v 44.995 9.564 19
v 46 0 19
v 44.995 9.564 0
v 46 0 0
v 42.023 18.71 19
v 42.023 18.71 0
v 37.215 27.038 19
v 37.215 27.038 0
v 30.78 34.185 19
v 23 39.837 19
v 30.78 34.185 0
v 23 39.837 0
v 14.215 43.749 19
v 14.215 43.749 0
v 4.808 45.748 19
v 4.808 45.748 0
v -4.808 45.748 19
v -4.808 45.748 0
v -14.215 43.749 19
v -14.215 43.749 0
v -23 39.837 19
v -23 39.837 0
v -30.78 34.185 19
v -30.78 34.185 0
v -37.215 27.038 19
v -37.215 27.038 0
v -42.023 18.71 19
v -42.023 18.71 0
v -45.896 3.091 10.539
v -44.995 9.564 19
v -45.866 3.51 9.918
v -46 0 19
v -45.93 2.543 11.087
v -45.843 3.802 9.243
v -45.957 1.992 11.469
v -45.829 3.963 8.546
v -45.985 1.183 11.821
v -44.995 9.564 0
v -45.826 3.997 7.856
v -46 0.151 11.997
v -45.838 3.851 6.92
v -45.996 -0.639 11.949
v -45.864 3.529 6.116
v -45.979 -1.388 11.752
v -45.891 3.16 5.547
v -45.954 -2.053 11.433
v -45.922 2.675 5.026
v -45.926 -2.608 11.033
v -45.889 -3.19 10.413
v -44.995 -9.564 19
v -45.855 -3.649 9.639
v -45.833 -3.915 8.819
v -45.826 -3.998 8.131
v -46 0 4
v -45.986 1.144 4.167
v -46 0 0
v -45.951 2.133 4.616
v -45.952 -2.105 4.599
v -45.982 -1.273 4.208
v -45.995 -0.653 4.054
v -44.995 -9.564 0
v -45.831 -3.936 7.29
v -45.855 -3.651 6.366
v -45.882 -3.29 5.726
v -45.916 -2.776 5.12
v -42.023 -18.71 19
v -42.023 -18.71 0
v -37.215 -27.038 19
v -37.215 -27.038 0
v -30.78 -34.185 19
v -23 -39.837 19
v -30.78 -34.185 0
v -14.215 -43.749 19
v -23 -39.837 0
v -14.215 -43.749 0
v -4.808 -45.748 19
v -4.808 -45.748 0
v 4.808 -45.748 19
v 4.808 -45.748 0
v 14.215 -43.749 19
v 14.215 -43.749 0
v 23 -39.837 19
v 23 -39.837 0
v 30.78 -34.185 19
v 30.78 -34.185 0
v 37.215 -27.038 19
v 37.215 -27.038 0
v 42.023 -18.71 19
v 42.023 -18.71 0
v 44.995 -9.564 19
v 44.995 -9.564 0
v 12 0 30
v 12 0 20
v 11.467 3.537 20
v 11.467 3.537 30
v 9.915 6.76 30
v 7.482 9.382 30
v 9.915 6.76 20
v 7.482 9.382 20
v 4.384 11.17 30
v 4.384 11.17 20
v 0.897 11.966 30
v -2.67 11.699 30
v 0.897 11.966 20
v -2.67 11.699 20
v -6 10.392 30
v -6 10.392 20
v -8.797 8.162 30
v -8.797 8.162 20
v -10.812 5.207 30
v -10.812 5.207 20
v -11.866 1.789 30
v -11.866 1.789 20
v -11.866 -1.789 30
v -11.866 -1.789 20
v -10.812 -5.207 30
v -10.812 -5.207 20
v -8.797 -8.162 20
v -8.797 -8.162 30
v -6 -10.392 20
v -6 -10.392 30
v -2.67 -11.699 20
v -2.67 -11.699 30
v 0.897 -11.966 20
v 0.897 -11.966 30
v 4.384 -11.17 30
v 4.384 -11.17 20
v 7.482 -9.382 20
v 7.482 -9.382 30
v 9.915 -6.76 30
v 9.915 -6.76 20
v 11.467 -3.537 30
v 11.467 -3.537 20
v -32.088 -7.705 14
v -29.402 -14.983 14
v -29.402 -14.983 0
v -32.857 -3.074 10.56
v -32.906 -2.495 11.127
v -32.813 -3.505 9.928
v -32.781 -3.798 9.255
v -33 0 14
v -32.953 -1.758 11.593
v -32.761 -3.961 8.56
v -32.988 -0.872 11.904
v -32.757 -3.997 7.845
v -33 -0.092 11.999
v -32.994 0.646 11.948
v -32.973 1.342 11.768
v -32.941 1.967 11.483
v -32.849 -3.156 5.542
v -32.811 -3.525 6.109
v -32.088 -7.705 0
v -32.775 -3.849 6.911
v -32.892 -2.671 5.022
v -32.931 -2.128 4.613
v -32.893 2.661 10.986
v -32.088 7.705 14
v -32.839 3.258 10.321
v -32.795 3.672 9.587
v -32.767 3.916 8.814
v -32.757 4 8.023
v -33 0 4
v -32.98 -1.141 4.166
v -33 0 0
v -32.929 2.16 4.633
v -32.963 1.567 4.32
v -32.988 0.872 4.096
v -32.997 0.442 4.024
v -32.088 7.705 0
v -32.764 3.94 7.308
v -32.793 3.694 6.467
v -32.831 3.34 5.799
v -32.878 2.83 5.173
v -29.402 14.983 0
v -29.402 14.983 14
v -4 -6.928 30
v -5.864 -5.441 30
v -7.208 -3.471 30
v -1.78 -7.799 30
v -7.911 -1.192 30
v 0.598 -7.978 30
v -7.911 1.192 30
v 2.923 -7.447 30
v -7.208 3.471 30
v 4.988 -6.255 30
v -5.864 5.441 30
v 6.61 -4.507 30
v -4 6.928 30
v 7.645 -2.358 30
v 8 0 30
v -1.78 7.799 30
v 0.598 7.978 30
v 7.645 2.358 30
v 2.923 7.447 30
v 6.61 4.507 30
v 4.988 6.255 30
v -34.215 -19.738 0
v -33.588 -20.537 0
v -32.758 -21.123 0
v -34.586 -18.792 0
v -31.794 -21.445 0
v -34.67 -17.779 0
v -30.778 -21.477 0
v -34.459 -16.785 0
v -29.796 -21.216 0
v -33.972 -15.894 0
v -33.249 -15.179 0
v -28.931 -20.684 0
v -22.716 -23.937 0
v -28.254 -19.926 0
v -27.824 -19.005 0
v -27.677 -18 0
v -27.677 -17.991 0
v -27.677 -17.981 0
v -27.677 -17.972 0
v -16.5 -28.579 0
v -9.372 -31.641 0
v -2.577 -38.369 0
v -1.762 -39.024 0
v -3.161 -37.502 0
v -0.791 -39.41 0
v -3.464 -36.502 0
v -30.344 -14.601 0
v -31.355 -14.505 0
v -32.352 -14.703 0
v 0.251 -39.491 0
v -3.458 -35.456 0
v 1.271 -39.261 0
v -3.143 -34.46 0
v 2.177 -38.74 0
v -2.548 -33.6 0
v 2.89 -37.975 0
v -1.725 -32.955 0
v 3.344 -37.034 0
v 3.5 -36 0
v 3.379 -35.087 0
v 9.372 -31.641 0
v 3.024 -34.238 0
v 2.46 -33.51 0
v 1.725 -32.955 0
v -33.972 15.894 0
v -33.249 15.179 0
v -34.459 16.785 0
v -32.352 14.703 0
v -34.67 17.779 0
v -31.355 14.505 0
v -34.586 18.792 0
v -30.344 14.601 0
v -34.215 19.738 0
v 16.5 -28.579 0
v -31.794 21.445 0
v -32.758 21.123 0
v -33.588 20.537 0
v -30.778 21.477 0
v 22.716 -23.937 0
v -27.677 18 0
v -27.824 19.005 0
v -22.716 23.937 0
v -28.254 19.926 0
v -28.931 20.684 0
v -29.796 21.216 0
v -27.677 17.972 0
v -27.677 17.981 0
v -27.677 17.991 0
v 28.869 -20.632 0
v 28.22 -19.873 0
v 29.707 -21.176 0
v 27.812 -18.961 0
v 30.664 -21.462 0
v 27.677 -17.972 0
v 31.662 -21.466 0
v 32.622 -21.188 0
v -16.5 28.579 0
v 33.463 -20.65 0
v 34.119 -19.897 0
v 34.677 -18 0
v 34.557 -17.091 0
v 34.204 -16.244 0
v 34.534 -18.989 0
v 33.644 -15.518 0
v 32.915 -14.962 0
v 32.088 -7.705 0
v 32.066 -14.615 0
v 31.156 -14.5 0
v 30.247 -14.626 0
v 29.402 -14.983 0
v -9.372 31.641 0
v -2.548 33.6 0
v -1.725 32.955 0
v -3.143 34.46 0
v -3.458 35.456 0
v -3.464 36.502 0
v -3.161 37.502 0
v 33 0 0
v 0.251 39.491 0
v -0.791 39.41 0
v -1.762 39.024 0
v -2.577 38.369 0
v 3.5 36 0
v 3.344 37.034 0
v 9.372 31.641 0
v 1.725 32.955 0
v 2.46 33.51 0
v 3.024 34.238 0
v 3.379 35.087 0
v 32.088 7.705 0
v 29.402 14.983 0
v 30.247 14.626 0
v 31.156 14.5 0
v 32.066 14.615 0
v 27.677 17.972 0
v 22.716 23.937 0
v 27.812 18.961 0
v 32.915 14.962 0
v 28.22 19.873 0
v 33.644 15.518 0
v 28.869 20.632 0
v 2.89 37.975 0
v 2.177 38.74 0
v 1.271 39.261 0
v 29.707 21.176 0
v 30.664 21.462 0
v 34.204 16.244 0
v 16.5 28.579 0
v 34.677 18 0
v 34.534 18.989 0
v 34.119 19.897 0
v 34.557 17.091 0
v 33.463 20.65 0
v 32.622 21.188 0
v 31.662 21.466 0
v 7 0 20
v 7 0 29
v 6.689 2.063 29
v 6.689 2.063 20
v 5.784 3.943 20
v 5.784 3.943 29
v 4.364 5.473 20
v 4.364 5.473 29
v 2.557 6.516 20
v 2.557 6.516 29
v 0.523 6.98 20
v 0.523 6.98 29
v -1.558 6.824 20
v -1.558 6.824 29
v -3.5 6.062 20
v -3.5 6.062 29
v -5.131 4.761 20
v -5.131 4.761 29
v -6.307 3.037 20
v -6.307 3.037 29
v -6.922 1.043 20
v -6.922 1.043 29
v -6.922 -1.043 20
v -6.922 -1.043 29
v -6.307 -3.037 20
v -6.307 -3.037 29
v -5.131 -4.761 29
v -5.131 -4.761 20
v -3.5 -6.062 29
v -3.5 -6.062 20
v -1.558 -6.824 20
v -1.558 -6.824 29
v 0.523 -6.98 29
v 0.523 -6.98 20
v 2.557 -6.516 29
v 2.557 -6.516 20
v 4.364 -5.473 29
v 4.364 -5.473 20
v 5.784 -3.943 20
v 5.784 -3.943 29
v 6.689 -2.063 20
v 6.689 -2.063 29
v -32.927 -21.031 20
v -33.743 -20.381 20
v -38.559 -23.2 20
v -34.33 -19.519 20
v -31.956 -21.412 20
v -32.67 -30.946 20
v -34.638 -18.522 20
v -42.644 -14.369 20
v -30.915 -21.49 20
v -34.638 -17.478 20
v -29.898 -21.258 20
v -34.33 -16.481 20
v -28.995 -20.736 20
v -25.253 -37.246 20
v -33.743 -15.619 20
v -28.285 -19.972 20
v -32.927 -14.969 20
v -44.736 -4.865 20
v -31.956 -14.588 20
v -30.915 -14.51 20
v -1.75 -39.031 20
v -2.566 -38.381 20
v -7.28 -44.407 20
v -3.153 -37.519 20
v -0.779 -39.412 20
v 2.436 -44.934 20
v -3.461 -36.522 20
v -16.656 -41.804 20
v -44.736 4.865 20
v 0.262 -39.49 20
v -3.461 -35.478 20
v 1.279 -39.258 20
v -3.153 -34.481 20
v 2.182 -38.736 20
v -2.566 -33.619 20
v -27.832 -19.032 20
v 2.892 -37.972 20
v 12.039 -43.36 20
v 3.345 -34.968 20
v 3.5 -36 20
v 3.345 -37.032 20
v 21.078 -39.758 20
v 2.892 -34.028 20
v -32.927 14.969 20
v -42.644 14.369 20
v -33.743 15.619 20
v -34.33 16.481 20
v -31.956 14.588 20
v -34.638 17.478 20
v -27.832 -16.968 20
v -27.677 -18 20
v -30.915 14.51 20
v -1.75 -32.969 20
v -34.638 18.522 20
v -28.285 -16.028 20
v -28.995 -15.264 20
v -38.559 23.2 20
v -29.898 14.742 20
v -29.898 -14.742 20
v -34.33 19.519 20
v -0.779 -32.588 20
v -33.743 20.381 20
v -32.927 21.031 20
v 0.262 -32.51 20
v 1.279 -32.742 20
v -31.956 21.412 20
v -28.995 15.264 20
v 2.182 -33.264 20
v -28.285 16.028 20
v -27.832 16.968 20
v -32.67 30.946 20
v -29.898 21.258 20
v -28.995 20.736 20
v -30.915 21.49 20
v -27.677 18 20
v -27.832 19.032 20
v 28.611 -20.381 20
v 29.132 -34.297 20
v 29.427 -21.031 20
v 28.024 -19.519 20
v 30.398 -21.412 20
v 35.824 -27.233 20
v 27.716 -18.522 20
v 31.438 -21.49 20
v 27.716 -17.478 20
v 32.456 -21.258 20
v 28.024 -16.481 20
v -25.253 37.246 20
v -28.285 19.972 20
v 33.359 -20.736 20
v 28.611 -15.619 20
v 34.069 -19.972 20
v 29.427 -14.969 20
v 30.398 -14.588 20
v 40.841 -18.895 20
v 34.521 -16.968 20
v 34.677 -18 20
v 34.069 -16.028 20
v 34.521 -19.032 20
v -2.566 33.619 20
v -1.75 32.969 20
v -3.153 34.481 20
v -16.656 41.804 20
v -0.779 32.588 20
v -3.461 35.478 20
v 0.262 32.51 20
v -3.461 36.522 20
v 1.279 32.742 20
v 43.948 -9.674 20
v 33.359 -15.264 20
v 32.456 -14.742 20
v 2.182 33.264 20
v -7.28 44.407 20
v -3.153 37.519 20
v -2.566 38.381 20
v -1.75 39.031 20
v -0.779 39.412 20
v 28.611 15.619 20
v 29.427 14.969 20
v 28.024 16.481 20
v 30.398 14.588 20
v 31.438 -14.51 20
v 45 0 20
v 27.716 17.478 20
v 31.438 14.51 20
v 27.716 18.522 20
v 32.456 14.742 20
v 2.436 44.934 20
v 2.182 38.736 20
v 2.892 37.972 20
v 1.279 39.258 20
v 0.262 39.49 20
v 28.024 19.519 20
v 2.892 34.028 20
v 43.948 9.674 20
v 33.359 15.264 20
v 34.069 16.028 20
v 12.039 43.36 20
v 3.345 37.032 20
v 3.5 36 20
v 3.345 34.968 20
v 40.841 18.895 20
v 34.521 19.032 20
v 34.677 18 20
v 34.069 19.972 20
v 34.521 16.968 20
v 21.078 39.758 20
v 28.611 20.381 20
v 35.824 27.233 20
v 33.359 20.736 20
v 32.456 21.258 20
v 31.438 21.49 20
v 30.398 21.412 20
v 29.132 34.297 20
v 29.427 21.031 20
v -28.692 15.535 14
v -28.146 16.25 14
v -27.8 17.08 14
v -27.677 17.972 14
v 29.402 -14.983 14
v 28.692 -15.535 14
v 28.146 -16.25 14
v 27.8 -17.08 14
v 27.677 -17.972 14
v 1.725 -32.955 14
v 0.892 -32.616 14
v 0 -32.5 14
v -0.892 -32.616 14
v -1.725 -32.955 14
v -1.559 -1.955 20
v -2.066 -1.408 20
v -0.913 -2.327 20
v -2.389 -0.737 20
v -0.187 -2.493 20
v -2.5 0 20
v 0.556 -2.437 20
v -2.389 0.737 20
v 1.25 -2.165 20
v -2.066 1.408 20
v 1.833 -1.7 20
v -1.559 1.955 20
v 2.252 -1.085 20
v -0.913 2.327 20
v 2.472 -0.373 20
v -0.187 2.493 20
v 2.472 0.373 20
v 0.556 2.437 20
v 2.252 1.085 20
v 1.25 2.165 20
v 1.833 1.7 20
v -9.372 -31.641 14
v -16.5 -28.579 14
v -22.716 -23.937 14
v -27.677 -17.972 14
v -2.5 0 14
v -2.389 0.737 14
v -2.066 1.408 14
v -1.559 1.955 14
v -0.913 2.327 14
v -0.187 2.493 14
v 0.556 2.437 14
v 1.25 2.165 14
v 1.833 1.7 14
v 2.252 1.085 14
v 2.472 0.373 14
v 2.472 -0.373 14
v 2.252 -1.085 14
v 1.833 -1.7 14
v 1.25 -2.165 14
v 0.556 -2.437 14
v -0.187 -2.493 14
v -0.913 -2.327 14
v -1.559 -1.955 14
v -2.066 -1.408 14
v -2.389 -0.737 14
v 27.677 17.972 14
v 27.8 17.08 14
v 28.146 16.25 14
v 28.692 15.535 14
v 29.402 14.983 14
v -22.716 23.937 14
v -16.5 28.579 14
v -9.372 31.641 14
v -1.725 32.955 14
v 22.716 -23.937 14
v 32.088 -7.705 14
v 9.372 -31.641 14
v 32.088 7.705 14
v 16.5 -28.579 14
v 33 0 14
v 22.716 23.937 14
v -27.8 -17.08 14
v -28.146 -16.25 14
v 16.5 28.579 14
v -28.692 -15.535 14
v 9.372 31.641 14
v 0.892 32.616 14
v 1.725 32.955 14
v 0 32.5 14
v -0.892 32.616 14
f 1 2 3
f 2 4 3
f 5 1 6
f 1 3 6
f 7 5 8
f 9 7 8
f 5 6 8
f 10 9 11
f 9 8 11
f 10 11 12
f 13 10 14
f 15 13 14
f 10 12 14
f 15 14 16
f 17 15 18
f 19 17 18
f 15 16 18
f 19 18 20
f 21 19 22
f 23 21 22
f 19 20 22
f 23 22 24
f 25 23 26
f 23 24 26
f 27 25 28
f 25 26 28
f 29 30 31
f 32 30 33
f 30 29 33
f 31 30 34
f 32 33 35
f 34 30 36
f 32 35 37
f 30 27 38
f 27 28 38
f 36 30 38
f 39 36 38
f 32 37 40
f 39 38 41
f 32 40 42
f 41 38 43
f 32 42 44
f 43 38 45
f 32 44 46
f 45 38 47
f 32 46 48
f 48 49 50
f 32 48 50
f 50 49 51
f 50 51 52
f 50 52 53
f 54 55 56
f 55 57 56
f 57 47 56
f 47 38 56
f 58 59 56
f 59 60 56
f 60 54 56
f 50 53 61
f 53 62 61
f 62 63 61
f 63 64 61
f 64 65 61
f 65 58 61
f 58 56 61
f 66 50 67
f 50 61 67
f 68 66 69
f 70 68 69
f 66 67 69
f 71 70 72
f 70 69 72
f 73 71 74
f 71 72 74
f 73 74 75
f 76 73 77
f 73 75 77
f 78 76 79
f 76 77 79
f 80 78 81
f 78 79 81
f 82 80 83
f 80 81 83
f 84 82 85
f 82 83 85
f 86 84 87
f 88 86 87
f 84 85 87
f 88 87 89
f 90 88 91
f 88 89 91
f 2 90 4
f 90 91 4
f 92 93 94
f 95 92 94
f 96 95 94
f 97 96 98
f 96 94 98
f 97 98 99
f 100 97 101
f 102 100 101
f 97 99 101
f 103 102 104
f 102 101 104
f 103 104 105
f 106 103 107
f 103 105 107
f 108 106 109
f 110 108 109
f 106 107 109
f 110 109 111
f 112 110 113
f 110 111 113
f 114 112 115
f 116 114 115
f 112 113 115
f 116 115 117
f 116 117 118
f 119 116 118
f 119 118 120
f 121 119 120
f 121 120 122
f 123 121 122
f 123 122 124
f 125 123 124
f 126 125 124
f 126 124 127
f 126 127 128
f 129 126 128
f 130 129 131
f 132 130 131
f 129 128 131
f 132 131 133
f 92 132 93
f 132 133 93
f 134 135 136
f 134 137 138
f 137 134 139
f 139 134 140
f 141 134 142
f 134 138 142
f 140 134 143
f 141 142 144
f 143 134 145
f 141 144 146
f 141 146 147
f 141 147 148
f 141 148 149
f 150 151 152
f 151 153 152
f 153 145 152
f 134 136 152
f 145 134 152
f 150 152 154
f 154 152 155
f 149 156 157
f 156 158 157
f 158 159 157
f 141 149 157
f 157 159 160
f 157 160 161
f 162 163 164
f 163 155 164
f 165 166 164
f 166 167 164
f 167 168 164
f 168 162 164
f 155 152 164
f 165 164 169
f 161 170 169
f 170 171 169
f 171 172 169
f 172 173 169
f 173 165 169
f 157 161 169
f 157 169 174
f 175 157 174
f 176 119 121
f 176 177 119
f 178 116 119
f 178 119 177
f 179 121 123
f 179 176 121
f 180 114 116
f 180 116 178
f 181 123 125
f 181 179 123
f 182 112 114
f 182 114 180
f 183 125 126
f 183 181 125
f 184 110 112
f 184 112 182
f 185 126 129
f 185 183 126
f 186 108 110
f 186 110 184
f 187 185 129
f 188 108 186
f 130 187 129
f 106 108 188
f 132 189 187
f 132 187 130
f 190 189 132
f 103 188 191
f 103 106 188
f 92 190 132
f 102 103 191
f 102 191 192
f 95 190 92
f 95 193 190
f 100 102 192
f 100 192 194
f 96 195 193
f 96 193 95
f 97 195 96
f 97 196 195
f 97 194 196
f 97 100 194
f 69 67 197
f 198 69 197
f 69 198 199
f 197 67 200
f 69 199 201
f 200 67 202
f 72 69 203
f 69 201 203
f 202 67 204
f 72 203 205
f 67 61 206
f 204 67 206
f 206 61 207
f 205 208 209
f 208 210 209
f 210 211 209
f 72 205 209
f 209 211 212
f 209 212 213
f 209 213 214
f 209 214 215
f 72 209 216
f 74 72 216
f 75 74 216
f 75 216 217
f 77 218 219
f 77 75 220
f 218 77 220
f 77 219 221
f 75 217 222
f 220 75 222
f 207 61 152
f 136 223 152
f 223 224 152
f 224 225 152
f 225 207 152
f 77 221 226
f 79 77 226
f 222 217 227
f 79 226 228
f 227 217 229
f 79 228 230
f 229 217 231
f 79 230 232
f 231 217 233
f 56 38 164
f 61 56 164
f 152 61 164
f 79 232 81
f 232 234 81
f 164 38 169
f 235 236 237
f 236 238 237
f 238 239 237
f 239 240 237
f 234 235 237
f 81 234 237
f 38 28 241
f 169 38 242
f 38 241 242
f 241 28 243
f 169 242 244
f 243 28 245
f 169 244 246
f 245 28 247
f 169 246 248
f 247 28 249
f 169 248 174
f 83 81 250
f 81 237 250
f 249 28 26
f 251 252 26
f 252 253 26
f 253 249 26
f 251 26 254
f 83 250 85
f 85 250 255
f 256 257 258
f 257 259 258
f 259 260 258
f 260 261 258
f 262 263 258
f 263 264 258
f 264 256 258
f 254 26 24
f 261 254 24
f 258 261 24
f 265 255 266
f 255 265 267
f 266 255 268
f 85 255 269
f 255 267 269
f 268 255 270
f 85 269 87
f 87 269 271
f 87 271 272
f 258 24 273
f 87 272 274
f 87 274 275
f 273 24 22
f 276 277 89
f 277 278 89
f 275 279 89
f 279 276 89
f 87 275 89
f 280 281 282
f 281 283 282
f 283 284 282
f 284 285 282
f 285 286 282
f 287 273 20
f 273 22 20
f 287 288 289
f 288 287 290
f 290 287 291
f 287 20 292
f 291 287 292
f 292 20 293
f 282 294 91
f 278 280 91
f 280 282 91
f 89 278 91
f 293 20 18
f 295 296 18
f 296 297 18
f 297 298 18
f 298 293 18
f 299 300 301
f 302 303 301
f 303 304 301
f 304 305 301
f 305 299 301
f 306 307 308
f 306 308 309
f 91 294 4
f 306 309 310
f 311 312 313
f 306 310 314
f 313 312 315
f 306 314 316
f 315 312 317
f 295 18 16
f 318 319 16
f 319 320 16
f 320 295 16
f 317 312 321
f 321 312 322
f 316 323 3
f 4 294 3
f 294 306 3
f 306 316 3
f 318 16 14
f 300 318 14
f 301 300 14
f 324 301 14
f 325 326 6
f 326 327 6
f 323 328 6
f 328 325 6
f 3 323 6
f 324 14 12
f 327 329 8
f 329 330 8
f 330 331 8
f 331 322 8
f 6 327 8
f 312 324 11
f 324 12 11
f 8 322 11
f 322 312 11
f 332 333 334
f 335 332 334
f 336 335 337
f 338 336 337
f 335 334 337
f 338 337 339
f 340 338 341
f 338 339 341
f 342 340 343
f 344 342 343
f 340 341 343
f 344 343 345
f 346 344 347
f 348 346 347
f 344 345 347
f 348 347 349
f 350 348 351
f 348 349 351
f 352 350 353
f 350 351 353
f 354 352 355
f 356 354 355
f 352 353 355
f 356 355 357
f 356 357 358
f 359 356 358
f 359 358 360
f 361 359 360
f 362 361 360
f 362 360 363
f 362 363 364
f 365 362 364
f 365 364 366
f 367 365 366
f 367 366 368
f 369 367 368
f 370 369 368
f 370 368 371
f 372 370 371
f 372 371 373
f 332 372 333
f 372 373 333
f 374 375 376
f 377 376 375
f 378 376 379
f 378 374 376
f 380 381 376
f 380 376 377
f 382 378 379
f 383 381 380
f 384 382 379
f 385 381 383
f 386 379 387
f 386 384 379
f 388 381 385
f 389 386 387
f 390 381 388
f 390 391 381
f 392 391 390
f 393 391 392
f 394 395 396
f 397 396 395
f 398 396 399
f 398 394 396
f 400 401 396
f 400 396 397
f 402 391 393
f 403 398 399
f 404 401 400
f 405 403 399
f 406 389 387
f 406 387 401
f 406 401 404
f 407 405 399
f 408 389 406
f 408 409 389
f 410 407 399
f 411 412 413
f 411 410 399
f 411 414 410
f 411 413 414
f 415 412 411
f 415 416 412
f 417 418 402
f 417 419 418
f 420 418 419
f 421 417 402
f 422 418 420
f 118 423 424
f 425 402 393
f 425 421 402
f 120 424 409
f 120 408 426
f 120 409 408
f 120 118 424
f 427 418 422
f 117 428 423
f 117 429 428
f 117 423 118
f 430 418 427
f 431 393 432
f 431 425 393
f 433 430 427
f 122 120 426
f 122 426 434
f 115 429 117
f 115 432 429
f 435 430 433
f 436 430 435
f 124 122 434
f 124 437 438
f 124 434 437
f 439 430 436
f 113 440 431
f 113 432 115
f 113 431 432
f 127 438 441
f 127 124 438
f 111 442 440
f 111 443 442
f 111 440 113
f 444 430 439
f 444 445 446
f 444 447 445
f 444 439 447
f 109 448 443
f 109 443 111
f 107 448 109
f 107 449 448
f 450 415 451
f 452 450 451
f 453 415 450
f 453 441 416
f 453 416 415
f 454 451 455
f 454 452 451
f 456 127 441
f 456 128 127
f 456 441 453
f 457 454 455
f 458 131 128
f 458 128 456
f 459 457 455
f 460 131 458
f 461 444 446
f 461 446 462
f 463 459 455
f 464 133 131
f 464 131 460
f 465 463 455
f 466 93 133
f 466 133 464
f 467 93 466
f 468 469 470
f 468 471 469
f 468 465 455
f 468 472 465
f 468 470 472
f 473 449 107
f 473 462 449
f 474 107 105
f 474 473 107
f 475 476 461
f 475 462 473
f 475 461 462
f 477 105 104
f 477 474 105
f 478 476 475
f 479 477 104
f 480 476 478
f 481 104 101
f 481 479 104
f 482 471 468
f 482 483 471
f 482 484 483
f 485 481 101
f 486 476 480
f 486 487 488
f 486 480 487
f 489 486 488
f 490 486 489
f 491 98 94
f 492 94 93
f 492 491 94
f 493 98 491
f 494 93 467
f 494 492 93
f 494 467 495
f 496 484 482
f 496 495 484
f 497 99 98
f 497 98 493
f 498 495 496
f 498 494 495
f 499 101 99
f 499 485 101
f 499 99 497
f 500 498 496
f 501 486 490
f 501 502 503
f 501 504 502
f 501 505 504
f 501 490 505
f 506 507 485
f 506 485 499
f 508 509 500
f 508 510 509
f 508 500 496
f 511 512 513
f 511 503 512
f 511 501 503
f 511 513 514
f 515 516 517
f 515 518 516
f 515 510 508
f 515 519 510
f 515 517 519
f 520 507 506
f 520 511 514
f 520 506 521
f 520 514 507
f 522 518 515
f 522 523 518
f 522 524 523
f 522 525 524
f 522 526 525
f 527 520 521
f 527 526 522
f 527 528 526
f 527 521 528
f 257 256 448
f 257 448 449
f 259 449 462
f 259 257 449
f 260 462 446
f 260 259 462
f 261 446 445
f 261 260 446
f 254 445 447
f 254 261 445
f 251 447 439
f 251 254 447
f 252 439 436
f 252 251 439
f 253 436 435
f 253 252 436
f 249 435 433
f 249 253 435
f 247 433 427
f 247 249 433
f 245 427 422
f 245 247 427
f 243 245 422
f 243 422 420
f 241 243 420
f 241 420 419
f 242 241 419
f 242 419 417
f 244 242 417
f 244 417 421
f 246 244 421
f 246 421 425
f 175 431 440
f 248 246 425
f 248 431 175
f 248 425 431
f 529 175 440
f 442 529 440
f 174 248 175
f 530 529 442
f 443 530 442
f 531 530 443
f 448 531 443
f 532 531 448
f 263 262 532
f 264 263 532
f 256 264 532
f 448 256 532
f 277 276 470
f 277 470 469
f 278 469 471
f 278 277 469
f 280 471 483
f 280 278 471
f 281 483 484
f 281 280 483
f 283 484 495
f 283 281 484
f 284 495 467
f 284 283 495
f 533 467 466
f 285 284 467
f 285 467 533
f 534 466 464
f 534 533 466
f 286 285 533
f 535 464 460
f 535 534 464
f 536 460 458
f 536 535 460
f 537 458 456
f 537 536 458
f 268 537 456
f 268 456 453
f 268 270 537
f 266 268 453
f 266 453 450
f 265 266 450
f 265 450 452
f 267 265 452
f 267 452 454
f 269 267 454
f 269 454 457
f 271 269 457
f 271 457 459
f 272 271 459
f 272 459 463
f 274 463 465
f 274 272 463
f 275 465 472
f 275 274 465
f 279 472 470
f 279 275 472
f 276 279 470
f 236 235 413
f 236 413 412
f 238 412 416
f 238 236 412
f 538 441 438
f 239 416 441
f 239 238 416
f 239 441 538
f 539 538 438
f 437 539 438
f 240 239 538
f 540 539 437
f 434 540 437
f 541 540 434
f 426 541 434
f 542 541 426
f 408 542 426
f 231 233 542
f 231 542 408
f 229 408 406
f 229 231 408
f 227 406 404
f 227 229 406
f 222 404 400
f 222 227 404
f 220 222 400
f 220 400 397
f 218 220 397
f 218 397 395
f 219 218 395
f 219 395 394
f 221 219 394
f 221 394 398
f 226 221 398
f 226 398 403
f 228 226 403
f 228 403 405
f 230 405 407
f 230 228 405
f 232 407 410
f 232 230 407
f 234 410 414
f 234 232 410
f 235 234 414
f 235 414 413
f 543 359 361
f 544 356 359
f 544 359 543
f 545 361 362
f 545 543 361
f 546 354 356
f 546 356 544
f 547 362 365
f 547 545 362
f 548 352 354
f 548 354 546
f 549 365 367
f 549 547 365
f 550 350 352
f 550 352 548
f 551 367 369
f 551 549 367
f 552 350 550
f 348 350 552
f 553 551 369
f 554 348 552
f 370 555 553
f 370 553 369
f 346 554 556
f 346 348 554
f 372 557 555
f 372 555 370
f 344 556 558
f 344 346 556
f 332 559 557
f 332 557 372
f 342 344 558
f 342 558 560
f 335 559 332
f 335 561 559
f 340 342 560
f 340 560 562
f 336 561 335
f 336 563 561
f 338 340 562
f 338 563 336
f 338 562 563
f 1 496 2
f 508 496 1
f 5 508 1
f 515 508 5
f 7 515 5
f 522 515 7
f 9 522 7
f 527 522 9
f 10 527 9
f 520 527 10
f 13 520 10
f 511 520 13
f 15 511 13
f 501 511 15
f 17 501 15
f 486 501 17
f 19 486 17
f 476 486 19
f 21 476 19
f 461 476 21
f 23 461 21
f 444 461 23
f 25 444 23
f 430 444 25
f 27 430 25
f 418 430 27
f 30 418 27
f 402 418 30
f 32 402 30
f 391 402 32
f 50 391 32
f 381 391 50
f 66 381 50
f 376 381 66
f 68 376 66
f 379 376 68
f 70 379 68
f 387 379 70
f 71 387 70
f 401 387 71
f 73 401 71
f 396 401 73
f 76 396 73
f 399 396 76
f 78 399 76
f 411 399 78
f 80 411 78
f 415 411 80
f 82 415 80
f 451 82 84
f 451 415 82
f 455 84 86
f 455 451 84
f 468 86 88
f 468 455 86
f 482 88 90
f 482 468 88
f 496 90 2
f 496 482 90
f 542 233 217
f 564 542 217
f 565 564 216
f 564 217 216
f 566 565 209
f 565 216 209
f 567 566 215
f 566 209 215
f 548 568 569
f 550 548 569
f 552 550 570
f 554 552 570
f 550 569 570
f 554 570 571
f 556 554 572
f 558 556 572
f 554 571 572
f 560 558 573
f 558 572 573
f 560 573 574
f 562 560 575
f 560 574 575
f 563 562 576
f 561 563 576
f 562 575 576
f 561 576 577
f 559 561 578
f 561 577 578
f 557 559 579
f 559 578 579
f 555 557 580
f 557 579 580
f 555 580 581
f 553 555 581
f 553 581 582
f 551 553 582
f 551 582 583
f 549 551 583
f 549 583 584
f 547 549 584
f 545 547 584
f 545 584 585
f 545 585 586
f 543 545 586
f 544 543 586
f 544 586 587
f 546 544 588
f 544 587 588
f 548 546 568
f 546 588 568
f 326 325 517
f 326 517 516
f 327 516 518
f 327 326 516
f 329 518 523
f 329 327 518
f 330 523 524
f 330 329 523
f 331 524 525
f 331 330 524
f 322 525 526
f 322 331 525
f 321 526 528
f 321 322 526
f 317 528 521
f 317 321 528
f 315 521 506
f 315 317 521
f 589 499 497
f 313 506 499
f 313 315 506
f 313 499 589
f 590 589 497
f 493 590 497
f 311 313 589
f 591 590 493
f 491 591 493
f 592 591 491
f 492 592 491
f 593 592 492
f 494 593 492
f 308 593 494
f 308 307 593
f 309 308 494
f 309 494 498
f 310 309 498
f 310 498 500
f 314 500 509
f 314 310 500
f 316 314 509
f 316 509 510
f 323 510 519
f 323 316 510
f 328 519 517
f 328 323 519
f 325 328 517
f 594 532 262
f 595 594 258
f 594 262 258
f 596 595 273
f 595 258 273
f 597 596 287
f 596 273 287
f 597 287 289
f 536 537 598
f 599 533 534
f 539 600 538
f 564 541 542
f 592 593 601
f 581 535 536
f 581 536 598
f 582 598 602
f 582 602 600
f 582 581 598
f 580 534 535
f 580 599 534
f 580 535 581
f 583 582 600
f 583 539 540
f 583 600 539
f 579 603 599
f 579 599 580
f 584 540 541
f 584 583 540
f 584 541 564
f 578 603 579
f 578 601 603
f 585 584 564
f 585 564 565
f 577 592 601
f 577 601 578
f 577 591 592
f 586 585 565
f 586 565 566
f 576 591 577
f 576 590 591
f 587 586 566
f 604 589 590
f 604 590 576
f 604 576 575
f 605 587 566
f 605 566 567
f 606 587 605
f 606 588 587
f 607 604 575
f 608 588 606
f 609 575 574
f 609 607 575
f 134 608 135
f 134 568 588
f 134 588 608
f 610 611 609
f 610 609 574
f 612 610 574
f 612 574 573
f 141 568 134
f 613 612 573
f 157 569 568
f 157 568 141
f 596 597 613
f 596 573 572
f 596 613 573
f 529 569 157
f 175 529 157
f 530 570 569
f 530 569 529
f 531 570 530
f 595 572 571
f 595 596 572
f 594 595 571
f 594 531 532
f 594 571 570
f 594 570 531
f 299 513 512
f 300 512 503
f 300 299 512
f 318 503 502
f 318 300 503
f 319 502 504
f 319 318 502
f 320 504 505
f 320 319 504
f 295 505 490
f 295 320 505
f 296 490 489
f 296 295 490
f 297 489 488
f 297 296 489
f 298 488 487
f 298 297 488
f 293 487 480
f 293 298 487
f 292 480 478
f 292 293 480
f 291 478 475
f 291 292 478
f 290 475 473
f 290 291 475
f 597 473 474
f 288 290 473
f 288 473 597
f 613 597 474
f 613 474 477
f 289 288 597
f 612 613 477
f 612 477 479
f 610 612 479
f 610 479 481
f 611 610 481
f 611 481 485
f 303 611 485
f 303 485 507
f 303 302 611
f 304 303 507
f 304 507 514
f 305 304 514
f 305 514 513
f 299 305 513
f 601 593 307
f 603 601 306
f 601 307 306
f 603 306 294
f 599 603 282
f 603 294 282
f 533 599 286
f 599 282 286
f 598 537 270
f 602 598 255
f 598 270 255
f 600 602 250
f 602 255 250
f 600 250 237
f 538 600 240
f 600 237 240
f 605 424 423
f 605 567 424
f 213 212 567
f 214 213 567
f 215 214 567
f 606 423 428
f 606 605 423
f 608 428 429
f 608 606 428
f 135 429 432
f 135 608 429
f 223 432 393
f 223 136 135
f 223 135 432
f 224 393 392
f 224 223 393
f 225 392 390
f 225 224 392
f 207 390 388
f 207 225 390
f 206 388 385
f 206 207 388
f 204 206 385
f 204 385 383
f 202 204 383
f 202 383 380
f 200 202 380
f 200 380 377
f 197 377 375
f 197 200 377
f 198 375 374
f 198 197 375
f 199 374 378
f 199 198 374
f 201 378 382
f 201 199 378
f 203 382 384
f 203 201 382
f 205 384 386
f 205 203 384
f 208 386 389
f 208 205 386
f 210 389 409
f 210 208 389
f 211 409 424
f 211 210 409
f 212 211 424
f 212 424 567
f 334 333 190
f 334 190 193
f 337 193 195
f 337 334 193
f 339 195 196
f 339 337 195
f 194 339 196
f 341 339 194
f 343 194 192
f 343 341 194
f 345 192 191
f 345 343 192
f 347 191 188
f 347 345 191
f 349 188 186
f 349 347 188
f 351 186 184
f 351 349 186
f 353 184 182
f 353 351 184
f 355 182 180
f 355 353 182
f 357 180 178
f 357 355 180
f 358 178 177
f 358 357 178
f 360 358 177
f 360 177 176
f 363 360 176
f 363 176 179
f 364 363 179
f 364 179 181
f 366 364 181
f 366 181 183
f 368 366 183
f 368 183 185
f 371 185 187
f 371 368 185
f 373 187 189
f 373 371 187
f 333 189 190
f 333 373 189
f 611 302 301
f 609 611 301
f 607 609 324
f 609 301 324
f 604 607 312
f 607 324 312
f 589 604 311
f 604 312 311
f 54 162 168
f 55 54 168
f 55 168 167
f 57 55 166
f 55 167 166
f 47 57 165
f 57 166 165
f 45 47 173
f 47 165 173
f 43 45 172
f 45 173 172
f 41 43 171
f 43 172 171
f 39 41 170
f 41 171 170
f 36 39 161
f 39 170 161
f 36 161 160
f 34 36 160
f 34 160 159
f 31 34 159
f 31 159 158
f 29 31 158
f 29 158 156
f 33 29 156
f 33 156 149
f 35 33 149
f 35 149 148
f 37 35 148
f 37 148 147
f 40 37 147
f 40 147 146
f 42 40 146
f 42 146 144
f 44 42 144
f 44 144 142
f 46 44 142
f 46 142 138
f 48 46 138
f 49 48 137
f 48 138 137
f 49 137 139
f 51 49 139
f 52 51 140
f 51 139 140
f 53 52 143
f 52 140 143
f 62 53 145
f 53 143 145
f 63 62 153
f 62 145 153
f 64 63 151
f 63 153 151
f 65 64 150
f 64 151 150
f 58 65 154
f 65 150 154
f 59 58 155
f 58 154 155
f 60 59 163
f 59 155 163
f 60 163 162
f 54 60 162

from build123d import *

# Parameters (mm, degrees)
SKETCH1_R           = 46
SKETCH1_R_2         = 3.5
BOSS_EXTRUDE1_DEPTH = 20
CHAMFER1_SIZE       = 1
SKETCH2_R           = 12
BOSS_EXTRUDE2_DEPTH = 10
SKETCH3_R           = 33
CUT_EXTRUDE1_DEPTH  = 14
SKETCH4_R           = 2.5
CUT_EXTRUDE2_DEPTH  = 6
SKETCH5_R           = 7
CUT_EXTRUDE3_DEPTH  = 10
CHAMFER2_SIZE       = 1
SKETCH6_R           = 4
CUT_EXTRUDE4_DEPTH  = 80


with BuildPart() as part:
    # Sketch1 → Boss-Extrude1 (new body)
    with BuildSketch(Plane.XY):
        Circle(SKETCH1_R)
        with Locations((0, 36)):
            Circle(SKETCH1_R_2, mode=Mode.SUBTRACT)
        with Locations((31.176914536, 18)):
            Circle(SKETCH1_R_2, mode=Mode.SUBTRACT)
        with Locations((31.176914536, -18)):
            Circle(SKETCH1_R_2, mode=Mode.SUBTRACT)
        with Locations((0, -36)):
            Circle(SKETCH1_R_2, mode=Mode.SUBTRACT)
        with Locations((-31.176914536, -18)):
            Circle(SKETCH1_R_2, mode=Mode.SUBTRACT)
        with Locations((-31.176914536, 18)):
            Circle(SKETCH1_R_2, mode=Mode.SUBTRACT)
    extrude(amount=BOSS_EXTRUDE1_DEPTH)

    # Chamfer1
    chamfer1_edges = [part.edges().sort_by_distance(p)[0] for p in [
        (-46, 0, 20),
    ]]
    chamfer(chamfer1_edges, length=CHAMFER1_SIZE)

    # Sketch2 → Boss-Extrude2 (add)
    with BuildSketch(Plane.XY.offset(20)):
        Circle(SKETCH2_R)
    extrude(amount=BOSS_EXTRUDE2_DEPTH)

    # Sketch3 → Cut-Extrude1 (cut)
    with BuildSketch(Plane(origin=(0, 0, 0), x_dir=(-1, 0, 0), z_dir=(0, 0, -1))):
        Circle(SKETCH3_R)
    extrude(amount=-CUT_EXTRUDE1_DEPTH, mode=Mode.SUBTRACT)

    # Sketch4 → Cut-Extrude2 (cut)
    with BuildSketch(Plane(origin=(0, 0, 14), x_dir=(-1, 0, 0), z_dir=(0, 0, -1))):
        Circle(SKETCH4_R)
    extrude(amount=-CUT_EXTRUDE2_DEPTH, mode=Mode.SUBTRACT)

    # Sketch5 → Cut-Extrude3 (cut)
    with BuildSketch(Plane.XY.offset(30)):
        Circle(SKETCH5_R)
    extrude(amount=-CUT_EXTRUDE3_DEPTH, mode=Mode.SUBTRACT)

    # Chamfer2
    chamfer2_edges = [part.edges().sort_by_distance(p)[0] for p in [
        (-7, 0, 30),
    ]]
    chamfer(chamfer2_edges, length=CHAMFER2_SIZE)

    # Sketch6 → Cut-Extrude4 (cut)
    with BuildSketch(Plane(origin=(0, 0, 0), x_dir=(0, 0, -1), z_dir=(1, 0, 0))):
        with Locations((-8, 0)):
            Circle(SKETCH6_R)
    extrude(amount=-CUT_EXTRUDE4_DEPTH, mode=Mode.SUBTRACT)


solid = part.part
